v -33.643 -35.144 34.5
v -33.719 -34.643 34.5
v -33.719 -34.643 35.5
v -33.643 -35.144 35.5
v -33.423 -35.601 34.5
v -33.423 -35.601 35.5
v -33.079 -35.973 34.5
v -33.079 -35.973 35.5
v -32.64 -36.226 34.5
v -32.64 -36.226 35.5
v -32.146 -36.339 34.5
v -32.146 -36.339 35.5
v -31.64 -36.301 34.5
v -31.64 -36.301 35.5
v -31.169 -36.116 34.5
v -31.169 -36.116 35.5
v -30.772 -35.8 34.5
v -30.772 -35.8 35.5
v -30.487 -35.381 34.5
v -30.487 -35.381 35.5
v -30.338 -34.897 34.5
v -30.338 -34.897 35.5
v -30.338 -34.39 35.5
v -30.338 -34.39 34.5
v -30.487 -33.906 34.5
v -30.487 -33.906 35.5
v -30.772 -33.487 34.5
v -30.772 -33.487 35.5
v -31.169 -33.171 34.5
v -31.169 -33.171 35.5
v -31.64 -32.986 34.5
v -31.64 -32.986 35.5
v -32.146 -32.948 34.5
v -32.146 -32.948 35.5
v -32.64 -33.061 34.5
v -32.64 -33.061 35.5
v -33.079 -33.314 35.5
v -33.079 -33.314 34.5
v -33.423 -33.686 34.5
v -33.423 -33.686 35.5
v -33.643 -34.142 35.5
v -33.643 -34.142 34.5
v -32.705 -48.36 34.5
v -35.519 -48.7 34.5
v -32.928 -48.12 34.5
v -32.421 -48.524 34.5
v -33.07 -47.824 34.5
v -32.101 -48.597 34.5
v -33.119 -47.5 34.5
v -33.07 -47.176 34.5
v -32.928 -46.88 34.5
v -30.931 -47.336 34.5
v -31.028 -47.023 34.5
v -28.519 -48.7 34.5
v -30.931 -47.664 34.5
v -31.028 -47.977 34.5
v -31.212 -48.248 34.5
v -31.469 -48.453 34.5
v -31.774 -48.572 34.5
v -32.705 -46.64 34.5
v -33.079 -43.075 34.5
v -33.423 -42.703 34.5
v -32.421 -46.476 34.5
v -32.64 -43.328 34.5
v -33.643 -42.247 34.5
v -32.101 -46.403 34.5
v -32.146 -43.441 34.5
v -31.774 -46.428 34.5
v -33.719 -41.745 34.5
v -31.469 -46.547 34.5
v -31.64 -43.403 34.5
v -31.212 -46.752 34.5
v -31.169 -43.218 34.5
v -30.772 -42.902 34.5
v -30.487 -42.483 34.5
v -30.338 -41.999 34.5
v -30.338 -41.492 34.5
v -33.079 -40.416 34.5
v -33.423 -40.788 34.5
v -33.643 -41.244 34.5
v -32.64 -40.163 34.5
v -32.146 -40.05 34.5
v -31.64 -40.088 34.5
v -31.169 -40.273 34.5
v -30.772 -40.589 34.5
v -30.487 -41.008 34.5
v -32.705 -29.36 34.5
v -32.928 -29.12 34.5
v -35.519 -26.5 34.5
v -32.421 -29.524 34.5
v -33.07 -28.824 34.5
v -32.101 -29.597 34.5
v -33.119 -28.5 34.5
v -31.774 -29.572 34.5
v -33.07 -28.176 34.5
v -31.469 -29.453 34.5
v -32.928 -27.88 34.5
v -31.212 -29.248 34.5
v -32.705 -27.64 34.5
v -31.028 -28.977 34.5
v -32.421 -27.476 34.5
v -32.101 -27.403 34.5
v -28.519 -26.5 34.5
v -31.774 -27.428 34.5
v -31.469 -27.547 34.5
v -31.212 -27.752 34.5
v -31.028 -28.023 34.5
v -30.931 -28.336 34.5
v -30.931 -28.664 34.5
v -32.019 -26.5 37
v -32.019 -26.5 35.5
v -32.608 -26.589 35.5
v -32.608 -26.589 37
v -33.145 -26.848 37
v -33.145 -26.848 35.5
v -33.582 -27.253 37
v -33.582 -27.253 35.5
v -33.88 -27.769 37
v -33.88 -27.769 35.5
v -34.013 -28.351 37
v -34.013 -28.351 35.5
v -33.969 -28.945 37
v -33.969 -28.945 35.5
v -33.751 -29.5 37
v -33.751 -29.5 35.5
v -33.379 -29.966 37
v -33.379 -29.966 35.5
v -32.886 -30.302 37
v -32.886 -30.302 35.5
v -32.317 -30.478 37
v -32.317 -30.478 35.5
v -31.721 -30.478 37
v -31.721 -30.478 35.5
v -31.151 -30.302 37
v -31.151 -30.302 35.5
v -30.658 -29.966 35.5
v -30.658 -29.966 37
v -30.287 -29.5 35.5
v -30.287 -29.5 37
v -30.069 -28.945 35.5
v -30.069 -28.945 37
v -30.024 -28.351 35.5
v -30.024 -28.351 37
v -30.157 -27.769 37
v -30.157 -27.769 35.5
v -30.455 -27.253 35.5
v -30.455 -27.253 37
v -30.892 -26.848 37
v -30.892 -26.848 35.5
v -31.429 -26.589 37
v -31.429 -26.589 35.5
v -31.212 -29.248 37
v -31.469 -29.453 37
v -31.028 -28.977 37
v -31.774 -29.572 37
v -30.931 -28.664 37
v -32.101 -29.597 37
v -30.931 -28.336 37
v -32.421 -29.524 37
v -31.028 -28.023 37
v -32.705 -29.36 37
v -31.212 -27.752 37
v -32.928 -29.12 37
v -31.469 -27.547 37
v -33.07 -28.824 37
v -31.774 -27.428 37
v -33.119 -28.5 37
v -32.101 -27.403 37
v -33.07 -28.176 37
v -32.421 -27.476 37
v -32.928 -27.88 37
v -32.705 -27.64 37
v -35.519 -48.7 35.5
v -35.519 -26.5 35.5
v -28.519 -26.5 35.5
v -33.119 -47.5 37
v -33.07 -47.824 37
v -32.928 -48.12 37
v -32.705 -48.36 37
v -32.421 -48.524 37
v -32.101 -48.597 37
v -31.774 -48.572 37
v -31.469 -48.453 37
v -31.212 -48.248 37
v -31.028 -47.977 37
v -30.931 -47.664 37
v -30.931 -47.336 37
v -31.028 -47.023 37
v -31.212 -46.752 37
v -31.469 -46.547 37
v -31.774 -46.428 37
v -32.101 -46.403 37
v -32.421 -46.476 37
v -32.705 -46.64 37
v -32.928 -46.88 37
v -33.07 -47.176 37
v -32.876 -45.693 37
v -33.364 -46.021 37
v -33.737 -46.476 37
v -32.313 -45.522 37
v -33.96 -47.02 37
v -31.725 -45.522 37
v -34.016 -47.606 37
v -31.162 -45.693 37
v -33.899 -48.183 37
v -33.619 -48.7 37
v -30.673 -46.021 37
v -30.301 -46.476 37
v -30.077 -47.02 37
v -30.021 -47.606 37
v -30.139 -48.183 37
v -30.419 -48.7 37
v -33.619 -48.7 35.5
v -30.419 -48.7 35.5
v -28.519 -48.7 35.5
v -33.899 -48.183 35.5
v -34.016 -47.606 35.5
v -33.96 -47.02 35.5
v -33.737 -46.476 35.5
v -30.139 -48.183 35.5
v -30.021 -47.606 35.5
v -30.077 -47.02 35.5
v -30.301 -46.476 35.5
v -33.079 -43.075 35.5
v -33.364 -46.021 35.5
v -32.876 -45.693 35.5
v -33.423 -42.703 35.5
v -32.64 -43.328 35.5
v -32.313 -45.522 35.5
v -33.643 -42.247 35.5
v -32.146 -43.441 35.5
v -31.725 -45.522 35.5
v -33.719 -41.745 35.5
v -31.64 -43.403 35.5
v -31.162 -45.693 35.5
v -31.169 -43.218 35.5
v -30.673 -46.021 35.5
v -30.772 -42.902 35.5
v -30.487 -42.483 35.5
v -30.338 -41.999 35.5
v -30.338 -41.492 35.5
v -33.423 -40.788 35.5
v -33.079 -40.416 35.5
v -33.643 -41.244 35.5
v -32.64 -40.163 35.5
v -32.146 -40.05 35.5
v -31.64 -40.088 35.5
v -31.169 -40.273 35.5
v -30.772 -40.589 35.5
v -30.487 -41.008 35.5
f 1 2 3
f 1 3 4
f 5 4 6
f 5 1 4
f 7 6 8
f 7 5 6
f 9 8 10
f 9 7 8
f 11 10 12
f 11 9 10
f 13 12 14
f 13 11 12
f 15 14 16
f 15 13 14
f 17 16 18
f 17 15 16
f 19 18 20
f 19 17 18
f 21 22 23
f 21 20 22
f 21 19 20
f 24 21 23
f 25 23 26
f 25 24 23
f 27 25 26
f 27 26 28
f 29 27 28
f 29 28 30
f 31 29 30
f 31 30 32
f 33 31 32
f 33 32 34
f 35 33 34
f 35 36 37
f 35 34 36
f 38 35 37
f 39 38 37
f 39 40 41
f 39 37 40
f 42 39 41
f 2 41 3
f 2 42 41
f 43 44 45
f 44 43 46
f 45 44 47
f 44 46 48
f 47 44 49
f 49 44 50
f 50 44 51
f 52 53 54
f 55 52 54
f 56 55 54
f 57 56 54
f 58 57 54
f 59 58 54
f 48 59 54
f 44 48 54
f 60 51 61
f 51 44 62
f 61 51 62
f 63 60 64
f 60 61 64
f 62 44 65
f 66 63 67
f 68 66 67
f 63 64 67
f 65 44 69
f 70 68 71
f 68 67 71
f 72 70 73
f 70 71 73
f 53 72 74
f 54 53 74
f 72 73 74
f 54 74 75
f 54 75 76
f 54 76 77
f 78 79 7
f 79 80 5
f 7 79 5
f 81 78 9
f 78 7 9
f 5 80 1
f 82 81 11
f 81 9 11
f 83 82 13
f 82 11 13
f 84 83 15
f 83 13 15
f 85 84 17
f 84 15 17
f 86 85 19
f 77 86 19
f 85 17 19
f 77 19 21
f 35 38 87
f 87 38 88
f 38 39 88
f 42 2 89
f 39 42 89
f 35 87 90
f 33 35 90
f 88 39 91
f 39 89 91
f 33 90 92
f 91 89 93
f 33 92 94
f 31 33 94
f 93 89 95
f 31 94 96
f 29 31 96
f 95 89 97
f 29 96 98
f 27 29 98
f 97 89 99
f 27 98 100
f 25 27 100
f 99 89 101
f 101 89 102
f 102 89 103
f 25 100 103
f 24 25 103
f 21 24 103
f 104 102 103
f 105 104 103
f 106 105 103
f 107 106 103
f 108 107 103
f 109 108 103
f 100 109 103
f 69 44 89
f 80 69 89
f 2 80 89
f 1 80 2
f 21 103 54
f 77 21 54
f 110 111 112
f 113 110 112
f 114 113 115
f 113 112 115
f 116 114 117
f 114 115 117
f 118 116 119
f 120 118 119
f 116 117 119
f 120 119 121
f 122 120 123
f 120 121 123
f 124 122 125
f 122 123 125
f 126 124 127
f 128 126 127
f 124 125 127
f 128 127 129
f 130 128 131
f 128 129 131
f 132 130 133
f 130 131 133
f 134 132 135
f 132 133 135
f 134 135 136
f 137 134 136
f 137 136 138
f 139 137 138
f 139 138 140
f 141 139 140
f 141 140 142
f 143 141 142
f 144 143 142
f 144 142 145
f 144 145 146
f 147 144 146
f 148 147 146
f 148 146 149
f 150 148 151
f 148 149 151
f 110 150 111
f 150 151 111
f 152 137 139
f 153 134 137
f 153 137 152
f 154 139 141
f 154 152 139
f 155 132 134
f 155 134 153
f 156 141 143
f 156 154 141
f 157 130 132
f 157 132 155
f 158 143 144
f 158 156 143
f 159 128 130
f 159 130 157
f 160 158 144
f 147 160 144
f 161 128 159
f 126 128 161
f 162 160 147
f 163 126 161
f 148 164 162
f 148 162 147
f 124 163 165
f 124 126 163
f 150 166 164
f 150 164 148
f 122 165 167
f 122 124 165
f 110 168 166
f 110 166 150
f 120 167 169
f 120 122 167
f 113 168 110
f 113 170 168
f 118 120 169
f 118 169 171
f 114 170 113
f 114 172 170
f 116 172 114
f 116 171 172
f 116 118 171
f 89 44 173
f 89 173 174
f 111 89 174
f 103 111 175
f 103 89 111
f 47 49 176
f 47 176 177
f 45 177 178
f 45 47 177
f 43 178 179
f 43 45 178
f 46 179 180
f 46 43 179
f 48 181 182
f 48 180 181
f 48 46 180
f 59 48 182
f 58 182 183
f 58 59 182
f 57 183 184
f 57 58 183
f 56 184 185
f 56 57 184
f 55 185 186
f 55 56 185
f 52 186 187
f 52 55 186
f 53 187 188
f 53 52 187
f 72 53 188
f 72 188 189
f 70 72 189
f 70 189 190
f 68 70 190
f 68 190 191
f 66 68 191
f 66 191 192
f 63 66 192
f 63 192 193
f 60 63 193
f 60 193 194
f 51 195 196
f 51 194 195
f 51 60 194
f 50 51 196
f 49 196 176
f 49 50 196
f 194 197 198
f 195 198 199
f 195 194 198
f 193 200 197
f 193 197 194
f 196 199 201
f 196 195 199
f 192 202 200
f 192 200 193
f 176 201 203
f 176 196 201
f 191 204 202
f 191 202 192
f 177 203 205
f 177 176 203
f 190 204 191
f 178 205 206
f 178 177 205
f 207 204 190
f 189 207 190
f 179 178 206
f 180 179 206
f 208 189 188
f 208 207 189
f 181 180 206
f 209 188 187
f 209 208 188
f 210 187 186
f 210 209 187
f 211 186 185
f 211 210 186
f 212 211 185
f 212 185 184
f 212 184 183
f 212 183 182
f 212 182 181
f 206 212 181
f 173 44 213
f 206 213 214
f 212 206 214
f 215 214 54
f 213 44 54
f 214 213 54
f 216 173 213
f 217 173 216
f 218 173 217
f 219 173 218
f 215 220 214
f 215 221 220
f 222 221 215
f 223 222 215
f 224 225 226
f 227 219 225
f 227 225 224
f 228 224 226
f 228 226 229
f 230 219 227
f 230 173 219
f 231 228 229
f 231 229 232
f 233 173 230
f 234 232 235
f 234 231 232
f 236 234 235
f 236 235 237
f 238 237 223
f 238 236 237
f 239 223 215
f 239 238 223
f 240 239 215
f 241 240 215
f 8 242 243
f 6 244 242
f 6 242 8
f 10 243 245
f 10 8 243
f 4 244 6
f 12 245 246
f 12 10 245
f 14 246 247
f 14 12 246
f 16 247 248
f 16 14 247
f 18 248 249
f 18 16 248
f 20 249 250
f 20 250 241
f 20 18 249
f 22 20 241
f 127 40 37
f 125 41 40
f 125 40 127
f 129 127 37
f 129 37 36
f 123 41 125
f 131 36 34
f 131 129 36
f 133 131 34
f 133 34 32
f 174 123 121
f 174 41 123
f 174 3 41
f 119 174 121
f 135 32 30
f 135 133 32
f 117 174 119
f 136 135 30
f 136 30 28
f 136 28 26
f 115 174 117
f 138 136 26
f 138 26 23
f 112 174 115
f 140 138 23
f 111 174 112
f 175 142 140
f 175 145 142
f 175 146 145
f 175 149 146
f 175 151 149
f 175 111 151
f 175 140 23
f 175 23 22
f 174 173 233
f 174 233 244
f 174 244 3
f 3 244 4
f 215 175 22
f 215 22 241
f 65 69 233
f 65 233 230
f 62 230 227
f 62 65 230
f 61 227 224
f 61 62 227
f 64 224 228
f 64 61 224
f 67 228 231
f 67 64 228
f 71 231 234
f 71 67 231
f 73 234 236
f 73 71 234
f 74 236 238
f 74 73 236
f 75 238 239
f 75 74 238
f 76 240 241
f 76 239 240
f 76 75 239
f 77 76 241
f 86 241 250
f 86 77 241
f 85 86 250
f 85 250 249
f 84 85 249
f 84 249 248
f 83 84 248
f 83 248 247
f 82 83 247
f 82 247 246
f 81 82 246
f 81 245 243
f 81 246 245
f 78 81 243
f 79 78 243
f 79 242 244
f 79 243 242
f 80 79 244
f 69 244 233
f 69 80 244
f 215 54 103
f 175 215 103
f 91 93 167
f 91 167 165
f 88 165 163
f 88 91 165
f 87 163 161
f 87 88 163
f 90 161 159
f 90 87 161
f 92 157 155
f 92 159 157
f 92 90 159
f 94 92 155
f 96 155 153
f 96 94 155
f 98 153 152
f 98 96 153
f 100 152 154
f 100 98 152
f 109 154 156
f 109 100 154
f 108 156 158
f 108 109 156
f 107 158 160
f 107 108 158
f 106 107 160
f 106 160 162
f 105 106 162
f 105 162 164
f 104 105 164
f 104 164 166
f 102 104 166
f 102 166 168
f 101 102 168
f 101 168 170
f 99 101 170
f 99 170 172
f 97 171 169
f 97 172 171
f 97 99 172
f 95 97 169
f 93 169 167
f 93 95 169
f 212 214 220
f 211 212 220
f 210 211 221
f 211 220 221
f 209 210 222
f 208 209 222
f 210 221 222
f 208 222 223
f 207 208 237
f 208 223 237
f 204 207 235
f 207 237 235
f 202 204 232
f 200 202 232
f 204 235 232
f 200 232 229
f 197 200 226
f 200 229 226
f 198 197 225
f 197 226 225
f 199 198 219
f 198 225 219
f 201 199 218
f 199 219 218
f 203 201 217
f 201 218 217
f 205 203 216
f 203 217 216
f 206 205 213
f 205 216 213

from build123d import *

# Parameters (mm, degrees)
RETAINER_PLATE_START            = 34.5
SKETCH1_W                       = 7
SKETCH1_H                       = 23
RETAINER_PLATE_DEPTH            = 1
RETAINER_MOUNTING_SPACERS_START = 35.5
SKETCH2_R                       = 2
RETAINER_MOUNTING_SPACERS_DEPTH = 1.5
RETAINER_CLEARANCE_HOLES_START  = 34
SKETCH3_R                       = 1.7
SKETCH3_R_2                     = 1.1
RETAINER_CLEARANCE_HOLES_DEPTH  = 4
CLEAR_END_WALL_START            = 33
SKETCH4_W                       = 15
SKETCH4_H                       = 6.3
CLEAR_END_WALL_DEPTH            = 6


with BuildPart() as part:
    # Sketch1 → Retainer_plate (new body)
    with BuildSketch(Plane.XY.offset(RETAINER_PLATE_START)):
        with Locations((-32.018684277, -38)):
            Rectangle(SKETCH1_W, SKETCH1_H)
    extrude(amount=RETAINER_PLATE_DEPTH)

    # Sketch2 → Retainer_mounting_spacers (add)
    with BuildSketch(Plane.XY.offset(RETAINER_MOUNTING_SPACERS_START)):
        with Locations(Location((-32.018684277, -47.5, 0), (0, 0, 270))):
            Circle(SKETCH2_R)
        with Locations(Location((-32.018684277, -28.5, 0), (0, 0, 90))):
            Circle(SKETCH2_R)
    extrude(amount=RETAINER_MOUNTING_SPACERS_DEPTH)

    # Sketch3 → Retainer_clearance_holes (cut)
    with BuildSketch(Plane.XY.offset(RETAINER_CLEARANCE_HOLES_START)):
        with Locations(Location((-32.018684277, -41.745416557, 0), (0, 0, 180))):
            Circle(SKETCH3_R)
        with Locations(Location((-32.018684277, -34.643402341, 0), (0, 0, 180))):
            Circle(SKETCH3_R)
        with Locations(Location((-32.018684277, -47.5, 0), (0, 0, 180))):
            Circle(SKETCH3_R_2)
        with Locations(Location((-32.018684277, -28.5, 0), (0, 0, 180))):
            Circle(SKETCH3_R_2)
    extrude(amount=RETAINER_CLEARANCE_HOLES_DEPTH, mode=Mode.SUBTRACT)

    # Sketch4 → Clear_end_wall (cut)
    with BuildSketch(Plane.XY.offset(CLEAR_END_WALL_START)):
        with Locations((-32.5, -51.85)):
            Rectangle(SKETCH4_W, SKETCH4_H)
    extrude(amount=CLEAR_END_WALL_DEPTH, mode=Mode.SUBTRACT)


solid = part.part
